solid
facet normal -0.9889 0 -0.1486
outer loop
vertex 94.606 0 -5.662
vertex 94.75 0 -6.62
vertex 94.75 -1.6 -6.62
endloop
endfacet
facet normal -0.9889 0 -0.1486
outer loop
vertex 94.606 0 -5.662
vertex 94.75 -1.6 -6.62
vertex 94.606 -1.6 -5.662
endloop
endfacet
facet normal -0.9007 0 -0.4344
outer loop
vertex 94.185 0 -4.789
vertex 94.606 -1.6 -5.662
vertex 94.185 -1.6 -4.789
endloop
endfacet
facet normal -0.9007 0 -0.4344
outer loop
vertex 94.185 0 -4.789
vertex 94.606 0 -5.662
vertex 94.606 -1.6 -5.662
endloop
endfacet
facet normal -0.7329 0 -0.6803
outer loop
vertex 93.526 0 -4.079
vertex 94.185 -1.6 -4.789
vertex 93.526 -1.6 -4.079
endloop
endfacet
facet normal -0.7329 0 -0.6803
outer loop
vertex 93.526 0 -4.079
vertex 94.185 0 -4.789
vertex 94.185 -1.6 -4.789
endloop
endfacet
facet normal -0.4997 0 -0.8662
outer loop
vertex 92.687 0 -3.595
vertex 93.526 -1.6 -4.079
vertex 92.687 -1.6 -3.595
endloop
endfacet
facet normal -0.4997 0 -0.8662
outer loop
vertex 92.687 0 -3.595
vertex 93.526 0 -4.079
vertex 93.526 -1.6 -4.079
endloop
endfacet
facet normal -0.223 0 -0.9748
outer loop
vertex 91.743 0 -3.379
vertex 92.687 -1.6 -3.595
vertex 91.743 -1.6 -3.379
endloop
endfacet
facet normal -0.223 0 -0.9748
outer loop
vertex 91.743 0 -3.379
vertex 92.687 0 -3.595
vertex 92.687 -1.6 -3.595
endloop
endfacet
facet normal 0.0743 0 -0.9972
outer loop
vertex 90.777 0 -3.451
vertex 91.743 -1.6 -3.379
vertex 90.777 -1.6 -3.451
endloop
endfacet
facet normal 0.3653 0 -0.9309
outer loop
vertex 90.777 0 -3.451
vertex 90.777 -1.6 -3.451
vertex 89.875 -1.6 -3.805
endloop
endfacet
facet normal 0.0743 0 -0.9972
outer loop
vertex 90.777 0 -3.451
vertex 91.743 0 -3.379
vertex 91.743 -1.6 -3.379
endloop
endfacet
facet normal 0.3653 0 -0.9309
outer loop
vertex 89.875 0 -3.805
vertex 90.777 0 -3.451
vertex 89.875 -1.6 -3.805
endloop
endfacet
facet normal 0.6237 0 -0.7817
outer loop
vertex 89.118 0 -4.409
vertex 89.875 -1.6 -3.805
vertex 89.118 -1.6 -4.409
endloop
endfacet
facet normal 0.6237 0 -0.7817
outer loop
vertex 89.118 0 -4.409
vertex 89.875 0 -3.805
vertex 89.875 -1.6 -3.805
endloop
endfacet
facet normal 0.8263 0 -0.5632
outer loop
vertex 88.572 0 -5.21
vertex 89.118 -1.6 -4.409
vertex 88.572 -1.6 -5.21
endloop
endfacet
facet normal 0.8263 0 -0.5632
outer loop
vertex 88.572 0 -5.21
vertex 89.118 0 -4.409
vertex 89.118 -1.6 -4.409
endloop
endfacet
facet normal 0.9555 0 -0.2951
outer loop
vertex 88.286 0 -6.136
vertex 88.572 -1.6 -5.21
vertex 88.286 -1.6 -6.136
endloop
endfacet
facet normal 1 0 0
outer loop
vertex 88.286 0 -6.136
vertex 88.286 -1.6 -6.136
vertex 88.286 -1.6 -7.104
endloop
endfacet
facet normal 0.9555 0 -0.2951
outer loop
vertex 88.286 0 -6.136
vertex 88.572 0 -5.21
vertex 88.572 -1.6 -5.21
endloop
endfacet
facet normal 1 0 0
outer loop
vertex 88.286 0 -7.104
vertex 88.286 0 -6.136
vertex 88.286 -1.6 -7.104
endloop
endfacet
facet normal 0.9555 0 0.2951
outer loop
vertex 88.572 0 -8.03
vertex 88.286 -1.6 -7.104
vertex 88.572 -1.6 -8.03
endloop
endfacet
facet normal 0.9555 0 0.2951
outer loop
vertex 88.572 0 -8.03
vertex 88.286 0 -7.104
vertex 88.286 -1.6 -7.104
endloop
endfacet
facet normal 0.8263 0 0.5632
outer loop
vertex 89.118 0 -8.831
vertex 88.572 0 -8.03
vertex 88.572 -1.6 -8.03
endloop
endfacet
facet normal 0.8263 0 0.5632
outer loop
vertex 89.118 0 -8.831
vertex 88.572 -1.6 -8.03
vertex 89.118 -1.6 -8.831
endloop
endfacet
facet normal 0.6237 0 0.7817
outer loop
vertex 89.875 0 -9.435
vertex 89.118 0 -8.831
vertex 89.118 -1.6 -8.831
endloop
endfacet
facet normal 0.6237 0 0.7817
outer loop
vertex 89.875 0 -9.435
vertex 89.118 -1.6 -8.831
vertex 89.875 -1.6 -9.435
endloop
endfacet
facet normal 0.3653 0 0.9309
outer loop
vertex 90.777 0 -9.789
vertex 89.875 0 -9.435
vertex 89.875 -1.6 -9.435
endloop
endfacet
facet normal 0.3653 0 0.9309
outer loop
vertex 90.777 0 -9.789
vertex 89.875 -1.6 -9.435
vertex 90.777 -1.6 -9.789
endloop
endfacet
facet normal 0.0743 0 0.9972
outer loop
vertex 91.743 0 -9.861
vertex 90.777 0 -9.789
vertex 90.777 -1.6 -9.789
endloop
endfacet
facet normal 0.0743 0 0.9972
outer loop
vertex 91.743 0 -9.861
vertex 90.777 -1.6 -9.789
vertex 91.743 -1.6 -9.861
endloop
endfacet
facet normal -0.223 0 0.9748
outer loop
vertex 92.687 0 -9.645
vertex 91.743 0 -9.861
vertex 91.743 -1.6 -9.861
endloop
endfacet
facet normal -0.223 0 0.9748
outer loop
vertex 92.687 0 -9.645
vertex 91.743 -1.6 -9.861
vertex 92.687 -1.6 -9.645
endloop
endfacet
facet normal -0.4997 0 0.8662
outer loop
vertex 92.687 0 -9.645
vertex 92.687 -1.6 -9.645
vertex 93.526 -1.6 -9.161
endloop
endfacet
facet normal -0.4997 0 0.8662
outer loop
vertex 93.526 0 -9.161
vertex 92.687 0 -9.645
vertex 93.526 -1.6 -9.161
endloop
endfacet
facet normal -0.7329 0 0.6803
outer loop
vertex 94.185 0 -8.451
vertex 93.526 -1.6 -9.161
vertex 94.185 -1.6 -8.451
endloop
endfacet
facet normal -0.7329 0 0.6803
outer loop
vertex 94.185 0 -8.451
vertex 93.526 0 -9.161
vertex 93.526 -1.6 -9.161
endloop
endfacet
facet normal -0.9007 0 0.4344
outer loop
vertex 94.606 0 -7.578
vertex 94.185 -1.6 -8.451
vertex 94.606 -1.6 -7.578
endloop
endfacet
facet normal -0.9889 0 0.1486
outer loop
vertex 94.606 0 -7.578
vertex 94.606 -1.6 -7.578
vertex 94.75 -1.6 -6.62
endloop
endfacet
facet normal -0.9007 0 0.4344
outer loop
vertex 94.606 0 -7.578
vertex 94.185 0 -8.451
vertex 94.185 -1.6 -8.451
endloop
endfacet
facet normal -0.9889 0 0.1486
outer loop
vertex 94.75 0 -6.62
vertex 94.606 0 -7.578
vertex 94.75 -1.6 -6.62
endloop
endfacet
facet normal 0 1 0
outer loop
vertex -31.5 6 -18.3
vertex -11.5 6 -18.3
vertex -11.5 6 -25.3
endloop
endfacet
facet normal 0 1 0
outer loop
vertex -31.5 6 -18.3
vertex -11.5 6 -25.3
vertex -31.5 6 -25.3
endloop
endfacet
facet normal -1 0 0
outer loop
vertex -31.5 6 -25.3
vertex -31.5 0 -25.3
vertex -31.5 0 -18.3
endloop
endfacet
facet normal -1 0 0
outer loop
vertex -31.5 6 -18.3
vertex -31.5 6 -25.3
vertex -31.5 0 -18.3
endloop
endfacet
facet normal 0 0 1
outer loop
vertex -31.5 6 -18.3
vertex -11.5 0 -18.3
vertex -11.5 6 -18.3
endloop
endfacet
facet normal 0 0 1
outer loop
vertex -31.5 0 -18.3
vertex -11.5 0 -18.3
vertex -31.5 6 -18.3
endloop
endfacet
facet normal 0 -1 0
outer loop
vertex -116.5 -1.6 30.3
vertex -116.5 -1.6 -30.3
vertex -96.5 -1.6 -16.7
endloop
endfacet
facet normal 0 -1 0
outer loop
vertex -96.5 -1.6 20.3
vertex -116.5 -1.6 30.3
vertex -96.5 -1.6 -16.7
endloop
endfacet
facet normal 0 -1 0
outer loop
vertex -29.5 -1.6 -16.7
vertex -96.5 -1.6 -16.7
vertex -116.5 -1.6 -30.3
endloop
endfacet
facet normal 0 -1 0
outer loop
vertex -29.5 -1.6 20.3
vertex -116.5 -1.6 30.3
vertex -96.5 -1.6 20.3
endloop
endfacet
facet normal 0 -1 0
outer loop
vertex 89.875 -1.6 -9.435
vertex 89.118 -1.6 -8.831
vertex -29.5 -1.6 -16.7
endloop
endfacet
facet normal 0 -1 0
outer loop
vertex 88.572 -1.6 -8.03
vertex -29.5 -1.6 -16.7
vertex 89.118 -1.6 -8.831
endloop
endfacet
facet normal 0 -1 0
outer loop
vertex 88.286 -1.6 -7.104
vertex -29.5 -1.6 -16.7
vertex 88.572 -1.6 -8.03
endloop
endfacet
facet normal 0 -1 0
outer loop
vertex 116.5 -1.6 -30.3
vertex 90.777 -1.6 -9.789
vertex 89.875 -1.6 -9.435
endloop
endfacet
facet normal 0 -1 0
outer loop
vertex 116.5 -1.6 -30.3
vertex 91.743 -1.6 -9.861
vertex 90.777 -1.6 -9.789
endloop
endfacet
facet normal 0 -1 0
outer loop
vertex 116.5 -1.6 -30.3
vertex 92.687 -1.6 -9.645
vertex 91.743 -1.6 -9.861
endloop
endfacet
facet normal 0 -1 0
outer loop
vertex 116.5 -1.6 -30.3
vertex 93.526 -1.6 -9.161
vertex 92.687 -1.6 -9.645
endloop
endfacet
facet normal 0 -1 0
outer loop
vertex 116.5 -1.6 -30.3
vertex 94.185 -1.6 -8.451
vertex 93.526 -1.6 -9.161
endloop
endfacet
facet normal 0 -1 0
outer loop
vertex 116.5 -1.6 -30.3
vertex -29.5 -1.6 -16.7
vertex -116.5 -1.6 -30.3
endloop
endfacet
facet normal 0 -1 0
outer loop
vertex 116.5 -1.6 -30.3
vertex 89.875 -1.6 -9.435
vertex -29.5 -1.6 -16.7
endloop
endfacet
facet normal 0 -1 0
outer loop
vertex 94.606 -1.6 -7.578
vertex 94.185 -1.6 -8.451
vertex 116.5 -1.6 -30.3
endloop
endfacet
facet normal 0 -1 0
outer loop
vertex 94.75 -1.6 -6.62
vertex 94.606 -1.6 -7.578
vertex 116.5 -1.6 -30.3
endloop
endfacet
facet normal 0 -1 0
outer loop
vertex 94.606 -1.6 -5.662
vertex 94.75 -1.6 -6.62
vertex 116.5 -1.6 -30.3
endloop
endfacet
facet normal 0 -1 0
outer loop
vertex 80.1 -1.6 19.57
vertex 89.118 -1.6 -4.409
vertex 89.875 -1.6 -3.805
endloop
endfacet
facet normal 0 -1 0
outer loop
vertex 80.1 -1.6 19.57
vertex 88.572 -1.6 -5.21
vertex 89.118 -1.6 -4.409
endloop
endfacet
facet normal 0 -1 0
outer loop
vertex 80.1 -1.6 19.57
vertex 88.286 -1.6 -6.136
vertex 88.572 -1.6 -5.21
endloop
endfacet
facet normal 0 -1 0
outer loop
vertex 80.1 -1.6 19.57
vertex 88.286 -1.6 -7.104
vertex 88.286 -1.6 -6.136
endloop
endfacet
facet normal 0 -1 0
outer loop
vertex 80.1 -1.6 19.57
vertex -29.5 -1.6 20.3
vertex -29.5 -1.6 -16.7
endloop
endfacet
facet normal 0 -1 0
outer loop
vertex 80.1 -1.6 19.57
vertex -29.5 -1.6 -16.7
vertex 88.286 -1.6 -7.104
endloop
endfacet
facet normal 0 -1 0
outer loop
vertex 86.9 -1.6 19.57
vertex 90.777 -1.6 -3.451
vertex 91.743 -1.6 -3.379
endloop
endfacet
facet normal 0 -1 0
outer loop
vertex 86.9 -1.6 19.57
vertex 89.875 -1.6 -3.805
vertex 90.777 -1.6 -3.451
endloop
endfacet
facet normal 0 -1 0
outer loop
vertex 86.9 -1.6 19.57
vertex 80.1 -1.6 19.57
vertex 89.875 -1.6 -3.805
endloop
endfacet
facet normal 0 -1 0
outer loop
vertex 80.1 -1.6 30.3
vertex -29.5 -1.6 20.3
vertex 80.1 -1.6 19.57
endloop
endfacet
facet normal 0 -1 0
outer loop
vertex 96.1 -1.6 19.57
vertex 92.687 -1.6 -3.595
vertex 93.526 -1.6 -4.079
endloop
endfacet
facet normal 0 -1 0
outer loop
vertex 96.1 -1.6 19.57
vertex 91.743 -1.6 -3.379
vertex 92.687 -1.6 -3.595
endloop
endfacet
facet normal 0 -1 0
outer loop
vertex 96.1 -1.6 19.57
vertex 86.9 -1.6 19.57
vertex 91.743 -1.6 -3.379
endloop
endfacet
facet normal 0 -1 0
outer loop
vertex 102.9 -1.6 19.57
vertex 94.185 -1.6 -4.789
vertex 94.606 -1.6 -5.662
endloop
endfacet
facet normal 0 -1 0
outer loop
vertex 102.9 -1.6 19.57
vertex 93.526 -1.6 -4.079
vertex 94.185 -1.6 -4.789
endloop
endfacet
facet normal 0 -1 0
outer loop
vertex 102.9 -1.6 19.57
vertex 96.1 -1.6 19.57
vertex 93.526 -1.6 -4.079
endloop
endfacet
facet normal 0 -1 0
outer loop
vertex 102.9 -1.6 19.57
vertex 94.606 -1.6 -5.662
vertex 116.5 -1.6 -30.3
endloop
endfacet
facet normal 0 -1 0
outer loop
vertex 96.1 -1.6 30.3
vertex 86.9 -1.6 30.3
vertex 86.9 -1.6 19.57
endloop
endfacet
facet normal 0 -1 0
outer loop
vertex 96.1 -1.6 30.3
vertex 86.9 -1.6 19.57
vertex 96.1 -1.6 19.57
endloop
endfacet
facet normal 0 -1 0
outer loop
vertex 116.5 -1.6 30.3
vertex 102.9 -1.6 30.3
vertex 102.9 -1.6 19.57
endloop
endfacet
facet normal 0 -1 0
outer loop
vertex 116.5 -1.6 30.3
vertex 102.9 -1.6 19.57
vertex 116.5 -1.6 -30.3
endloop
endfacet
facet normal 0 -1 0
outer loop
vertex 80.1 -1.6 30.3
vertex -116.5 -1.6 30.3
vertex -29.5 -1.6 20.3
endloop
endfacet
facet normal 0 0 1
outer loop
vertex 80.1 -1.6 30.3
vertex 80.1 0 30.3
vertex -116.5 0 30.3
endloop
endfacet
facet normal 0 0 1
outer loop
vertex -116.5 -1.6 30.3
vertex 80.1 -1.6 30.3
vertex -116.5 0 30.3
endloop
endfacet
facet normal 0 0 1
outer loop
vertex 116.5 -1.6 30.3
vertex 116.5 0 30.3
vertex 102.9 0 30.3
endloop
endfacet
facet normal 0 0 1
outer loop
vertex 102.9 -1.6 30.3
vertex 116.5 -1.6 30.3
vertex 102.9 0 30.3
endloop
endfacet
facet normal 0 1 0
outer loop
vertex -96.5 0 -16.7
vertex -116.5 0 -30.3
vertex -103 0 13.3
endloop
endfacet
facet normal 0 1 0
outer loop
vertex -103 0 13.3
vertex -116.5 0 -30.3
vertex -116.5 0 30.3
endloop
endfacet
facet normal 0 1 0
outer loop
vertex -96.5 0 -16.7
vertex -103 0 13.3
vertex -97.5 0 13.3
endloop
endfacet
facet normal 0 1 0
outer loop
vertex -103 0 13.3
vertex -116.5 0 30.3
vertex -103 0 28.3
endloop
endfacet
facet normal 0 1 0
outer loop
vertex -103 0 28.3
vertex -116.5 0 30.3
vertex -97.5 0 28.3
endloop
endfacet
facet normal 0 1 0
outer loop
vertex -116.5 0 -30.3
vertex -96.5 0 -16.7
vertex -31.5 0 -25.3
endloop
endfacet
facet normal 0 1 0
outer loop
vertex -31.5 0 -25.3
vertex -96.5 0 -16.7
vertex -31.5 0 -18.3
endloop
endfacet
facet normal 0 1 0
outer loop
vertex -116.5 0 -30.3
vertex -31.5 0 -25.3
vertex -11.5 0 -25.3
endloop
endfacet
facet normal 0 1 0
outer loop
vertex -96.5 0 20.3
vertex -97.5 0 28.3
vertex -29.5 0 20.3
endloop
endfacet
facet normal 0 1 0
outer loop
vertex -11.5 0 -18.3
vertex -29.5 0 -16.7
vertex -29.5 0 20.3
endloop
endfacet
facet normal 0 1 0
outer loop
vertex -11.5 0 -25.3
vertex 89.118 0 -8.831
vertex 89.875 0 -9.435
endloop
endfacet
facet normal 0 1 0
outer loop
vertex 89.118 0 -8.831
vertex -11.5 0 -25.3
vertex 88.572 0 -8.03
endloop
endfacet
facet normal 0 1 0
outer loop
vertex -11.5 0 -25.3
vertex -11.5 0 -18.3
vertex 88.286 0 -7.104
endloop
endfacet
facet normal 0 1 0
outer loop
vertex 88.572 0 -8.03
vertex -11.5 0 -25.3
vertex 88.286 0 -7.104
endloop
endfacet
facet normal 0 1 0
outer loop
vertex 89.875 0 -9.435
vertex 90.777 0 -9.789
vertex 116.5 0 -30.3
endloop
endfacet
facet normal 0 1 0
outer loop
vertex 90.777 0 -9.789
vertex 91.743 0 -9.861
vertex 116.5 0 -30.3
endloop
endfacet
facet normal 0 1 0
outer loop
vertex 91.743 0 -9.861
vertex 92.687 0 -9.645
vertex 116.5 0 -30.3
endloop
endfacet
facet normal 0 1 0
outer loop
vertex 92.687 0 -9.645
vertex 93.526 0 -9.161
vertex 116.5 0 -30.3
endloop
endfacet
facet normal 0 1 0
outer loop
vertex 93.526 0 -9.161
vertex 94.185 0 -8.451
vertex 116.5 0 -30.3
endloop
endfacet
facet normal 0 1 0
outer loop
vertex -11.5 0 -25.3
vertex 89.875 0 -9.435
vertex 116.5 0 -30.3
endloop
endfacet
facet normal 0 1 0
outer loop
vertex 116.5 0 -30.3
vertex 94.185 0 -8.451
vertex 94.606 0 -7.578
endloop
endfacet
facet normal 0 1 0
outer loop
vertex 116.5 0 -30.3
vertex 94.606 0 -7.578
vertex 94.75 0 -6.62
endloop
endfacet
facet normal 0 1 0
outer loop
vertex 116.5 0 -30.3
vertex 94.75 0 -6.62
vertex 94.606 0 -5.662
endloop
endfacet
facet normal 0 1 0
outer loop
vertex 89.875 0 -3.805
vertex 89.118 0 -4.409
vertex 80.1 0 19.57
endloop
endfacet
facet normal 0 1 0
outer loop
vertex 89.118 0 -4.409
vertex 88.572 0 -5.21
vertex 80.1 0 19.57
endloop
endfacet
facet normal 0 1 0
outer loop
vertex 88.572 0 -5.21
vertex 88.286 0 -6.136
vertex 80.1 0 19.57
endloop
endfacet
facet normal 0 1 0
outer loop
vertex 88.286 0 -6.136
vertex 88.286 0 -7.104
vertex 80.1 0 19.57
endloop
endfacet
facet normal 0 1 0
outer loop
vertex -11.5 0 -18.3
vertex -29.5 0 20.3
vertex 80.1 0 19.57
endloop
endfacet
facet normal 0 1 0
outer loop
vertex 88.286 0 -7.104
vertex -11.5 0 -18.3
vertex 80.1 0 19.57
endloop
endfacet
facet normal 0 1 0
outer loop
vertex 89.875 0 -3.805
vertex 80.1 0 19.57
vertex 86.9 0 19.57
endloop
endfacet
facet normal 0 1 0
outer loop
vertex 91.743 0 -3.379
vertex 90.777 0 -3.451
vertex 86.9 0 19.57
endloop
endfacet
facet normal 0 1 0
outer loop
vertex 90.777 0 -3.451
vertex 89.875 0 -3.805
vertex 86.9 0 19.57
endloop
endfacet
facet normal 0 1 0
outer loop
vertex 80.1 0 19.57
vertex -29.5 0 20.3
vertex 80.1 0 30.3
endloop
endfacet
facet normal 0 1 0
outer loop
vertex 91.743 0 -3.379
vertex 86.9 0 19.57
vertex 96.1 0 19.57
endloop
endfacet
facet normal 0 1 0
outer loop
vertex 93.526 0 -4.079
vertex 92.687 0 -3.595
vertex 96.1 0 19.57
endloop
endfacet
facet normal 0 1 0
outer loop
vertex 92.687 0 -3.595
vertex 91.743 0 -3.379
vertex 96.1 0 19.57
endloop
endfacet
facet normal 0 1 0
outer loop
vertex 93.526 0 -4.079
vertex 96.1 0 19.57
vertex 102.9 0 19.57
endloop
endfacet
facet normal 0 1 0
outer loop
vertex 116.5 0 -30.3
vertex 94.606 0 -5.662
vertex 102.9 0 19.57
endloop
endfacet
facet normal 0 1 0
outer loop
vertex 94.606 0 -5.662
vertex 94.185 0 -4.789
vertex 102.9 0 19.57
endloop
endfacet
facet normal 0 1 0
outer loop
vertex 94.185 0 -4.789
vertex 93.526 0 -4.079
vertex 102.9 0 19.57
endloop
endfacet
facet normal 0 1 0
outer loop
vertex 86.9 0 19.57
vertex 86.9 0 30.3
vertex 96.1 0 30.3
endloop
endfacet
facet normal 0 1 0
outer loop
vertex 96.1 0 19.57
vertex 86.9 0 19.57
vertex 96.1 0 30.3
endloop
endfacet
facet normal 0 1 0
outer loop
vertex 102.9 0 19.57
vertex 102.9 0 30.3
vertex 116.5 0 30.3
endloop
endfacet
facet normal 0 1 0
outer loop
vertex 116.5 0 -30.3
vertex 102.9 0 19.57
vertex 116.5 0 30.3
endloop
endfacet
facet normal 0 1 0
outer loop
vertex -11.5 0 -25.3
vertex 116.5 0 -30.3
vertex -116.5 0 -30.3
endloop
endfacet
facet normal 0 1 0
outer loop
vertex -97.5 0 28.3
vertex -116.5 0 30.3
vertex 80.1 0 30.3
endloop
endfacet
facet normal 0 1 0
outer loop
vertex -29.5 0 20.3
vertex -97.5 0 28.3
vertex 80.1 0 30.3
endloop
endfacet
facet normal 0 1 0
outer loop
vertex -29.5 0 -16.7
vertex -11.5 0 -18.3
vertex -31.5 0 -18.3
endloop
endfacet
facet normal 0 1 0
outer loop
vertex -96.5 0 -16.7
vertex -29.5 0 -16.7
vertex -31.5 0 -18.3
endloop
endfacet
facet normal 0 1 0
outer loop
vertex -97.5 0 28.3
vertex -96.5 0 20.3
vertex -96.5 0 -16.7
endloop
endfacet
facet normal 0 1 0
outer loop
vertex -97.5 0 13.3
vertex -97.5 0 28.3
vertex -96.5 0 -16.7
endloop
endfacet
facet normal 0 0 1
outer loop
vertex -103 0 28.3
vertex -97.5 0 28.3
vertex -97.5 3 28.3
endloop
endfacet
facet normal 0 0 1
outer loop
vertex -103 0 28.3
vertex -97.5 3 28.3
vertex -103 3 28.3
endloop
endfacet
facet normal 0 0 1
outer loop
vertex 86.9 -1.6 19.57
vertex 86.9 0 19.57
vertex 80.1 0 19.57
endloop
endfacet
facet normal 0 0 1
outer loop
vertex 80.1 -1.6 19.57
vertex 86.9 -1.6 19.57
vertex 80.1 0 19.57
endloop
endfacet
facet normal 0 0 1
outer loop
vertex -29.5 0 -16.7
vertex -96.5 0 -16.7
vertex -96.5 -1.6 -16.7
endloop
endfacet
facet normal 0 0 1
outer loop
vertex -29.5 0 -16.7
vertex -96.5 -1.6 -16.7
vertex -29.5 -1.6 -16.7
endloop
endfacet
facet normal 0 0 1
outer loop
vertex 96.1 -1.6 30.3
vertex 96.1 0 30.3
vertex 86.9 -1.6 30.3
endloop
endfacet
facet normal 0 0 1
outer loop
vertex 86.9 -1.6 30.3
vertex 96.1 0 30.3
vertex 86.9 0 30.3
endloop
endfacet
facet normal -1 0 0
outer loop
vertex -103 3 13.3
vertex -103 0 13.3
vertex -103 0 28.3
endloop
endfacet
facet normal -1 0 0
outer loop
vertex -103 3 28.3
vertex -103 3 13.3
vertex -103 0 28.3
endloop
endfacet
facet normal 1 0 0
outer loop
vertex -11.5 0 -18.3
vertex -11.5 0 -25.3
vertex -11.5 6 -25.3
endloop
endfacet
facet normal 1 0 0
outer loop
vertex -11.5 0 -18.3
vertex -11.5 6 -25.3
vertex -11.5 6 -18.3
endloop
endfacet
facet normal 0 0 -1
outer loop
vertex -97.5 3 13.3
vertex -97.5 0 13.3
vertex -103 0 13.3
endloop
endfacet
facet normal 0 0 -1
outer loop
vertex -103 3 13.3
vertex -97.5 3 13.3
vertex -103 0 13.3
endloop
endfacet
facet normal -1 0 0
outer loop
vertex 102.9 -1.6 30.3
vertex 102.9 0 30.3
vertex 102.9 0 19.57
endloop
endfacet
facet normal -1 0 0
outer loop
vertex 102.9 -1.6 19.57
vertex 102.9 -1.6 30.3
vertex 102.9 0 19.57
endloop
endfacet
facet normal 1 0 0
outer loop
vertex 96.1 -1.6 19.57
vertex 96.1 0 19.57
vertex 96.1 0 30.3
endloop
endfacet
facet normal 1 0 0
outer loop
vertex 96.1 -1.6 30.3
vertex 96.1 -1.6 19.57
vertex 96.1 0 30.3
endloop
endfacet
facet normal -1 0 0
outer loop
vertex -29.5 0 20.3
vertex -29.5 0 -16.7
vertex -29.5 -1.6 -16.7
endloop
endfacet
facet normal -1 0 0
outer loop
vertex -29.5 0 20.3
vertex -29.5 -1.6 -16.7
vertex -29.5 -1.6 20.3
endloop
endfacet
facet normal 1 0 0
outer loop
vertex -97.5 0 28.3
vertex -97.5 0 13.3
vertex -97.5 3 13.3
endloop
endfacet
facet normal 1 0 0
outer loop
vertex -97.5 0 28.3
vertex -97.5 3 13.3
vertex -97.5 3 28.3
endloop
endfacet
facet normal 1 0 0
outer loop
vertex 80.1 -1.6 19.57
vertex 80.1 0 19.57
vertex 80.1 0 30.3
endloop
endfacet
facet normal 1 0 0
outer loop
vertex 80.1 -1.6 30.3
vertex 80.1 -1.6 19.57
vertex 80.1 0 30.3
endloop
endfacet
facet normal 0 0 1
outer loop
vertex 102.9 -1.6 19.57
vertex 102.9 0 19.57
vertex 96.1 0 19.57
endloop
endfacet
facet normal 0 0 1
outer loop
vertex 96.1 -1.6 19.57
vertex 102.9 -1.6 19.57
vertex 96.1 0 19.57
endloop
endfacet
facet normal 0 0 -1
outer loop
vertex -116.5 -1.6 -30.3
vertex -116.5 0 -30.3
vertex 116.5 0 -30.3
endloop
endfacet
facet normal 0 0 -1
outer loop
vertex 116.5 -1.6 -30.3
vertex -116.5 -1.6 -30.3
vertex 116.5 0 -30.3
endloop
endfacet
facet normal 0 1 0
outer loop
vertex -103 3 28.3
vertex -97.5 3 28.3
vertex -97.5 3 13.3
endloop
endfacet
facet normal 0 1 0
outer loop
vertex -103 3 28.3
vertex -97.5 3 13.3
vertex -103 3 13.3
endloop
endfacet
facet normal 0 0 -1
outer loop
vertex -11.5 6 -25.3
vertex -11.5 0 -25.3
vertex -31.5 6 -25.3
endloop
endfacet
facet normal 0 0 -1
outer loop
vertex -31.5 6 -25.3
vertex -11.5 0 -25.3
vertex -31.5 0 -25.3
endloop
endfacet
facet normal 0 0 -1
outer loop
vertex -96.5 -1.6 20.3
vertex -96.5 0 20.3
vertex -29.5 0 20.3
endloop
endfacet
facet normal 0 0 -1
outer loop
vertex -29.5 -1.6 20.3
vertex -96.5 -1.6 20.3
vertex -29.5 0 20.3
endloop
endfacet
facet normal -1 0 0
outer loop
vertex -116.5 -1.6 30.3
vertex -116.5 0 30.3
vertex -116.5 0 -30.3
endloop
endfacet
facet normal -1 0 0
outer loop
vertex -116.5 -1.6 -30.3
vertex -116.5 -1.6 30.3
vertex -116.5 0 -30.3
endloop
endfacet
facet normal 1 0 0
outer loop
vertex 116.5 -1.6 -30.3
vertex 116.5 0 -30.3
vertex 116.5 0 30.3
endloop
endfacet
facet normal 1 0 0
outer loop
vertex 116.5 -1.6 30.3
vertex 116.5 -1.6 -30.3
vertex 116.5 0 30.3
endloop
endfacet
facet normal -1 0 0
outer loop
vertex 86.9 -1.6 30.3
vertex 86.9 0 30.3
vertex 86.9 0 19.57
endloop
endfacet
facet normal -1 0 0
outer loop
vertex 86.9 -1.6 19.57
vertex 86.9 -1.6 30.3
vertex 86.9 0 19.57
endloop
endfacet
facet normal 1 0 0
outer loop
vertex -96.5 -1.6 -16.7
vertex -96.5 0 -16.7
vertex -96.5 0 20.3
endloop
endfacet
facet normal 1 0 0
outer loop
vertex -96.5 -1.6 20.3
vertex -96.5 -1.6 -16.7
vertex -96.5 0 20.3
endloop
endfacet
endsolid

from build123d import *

# Parameters (mm, degrees)
F0_R     = 3.25
F0_W     = 67
F0_H     = 37
F1_DEPTH = 1.6
F2_W     = 20
F2_H     = 7
F3_DEPTH = 6
F4_W     = 5.5
F4_H     = 15
F5_DEPTH = 3


with BuildPart() as f1:
    # F0 (on Front) → F1 (new body)
    with BuildSketch(Plane.XZ):
        Polygon((-116.5, -30.3), (116.5, -30.3), (116.5, 30.3), (102.9, 30.3), (102.9, 19.57), (96.1, 19.57), (96.1, 30.3), (86.9, 30.3), (86.9, 19.57), (80.1, 19.57), (80.1, 30.3), (-116.5, 30.3), align=None)
        with Locations((91.5, -6.62)):
            Circle(F0_R, mode=Mode.SUBTRACT)
        with Locations((-63, 1.8)):
            Rectangle(F0_W, F0_H, mode=Mode.SUBTRACT)
    extrude(amount=F1_DEPTH)

    # F2 (on face) → F3 (join)
    with BuildSketch(Plane(origin=(0, 0, 0), x_dir=(-1, 0, 0), z_dir=(0, 1, 0))):
        with Locations((21.5, -21.8)):
            Rectangle(F2_W, F2_H)
    extrude(amount=F3_DEPTH)

    # F4 (on face) → F5 (join)
    with BuildSketch(Plane(origin=(0, 0, 0), x_dir=(-1, 0, 0), z_dir=(0, 1, 0))):
        with Locations((100.25, 20.8)):
            Rectangle(F4_W, F4_H)
    extrude(amount=F5_DEPTH)


solid = f1.part
